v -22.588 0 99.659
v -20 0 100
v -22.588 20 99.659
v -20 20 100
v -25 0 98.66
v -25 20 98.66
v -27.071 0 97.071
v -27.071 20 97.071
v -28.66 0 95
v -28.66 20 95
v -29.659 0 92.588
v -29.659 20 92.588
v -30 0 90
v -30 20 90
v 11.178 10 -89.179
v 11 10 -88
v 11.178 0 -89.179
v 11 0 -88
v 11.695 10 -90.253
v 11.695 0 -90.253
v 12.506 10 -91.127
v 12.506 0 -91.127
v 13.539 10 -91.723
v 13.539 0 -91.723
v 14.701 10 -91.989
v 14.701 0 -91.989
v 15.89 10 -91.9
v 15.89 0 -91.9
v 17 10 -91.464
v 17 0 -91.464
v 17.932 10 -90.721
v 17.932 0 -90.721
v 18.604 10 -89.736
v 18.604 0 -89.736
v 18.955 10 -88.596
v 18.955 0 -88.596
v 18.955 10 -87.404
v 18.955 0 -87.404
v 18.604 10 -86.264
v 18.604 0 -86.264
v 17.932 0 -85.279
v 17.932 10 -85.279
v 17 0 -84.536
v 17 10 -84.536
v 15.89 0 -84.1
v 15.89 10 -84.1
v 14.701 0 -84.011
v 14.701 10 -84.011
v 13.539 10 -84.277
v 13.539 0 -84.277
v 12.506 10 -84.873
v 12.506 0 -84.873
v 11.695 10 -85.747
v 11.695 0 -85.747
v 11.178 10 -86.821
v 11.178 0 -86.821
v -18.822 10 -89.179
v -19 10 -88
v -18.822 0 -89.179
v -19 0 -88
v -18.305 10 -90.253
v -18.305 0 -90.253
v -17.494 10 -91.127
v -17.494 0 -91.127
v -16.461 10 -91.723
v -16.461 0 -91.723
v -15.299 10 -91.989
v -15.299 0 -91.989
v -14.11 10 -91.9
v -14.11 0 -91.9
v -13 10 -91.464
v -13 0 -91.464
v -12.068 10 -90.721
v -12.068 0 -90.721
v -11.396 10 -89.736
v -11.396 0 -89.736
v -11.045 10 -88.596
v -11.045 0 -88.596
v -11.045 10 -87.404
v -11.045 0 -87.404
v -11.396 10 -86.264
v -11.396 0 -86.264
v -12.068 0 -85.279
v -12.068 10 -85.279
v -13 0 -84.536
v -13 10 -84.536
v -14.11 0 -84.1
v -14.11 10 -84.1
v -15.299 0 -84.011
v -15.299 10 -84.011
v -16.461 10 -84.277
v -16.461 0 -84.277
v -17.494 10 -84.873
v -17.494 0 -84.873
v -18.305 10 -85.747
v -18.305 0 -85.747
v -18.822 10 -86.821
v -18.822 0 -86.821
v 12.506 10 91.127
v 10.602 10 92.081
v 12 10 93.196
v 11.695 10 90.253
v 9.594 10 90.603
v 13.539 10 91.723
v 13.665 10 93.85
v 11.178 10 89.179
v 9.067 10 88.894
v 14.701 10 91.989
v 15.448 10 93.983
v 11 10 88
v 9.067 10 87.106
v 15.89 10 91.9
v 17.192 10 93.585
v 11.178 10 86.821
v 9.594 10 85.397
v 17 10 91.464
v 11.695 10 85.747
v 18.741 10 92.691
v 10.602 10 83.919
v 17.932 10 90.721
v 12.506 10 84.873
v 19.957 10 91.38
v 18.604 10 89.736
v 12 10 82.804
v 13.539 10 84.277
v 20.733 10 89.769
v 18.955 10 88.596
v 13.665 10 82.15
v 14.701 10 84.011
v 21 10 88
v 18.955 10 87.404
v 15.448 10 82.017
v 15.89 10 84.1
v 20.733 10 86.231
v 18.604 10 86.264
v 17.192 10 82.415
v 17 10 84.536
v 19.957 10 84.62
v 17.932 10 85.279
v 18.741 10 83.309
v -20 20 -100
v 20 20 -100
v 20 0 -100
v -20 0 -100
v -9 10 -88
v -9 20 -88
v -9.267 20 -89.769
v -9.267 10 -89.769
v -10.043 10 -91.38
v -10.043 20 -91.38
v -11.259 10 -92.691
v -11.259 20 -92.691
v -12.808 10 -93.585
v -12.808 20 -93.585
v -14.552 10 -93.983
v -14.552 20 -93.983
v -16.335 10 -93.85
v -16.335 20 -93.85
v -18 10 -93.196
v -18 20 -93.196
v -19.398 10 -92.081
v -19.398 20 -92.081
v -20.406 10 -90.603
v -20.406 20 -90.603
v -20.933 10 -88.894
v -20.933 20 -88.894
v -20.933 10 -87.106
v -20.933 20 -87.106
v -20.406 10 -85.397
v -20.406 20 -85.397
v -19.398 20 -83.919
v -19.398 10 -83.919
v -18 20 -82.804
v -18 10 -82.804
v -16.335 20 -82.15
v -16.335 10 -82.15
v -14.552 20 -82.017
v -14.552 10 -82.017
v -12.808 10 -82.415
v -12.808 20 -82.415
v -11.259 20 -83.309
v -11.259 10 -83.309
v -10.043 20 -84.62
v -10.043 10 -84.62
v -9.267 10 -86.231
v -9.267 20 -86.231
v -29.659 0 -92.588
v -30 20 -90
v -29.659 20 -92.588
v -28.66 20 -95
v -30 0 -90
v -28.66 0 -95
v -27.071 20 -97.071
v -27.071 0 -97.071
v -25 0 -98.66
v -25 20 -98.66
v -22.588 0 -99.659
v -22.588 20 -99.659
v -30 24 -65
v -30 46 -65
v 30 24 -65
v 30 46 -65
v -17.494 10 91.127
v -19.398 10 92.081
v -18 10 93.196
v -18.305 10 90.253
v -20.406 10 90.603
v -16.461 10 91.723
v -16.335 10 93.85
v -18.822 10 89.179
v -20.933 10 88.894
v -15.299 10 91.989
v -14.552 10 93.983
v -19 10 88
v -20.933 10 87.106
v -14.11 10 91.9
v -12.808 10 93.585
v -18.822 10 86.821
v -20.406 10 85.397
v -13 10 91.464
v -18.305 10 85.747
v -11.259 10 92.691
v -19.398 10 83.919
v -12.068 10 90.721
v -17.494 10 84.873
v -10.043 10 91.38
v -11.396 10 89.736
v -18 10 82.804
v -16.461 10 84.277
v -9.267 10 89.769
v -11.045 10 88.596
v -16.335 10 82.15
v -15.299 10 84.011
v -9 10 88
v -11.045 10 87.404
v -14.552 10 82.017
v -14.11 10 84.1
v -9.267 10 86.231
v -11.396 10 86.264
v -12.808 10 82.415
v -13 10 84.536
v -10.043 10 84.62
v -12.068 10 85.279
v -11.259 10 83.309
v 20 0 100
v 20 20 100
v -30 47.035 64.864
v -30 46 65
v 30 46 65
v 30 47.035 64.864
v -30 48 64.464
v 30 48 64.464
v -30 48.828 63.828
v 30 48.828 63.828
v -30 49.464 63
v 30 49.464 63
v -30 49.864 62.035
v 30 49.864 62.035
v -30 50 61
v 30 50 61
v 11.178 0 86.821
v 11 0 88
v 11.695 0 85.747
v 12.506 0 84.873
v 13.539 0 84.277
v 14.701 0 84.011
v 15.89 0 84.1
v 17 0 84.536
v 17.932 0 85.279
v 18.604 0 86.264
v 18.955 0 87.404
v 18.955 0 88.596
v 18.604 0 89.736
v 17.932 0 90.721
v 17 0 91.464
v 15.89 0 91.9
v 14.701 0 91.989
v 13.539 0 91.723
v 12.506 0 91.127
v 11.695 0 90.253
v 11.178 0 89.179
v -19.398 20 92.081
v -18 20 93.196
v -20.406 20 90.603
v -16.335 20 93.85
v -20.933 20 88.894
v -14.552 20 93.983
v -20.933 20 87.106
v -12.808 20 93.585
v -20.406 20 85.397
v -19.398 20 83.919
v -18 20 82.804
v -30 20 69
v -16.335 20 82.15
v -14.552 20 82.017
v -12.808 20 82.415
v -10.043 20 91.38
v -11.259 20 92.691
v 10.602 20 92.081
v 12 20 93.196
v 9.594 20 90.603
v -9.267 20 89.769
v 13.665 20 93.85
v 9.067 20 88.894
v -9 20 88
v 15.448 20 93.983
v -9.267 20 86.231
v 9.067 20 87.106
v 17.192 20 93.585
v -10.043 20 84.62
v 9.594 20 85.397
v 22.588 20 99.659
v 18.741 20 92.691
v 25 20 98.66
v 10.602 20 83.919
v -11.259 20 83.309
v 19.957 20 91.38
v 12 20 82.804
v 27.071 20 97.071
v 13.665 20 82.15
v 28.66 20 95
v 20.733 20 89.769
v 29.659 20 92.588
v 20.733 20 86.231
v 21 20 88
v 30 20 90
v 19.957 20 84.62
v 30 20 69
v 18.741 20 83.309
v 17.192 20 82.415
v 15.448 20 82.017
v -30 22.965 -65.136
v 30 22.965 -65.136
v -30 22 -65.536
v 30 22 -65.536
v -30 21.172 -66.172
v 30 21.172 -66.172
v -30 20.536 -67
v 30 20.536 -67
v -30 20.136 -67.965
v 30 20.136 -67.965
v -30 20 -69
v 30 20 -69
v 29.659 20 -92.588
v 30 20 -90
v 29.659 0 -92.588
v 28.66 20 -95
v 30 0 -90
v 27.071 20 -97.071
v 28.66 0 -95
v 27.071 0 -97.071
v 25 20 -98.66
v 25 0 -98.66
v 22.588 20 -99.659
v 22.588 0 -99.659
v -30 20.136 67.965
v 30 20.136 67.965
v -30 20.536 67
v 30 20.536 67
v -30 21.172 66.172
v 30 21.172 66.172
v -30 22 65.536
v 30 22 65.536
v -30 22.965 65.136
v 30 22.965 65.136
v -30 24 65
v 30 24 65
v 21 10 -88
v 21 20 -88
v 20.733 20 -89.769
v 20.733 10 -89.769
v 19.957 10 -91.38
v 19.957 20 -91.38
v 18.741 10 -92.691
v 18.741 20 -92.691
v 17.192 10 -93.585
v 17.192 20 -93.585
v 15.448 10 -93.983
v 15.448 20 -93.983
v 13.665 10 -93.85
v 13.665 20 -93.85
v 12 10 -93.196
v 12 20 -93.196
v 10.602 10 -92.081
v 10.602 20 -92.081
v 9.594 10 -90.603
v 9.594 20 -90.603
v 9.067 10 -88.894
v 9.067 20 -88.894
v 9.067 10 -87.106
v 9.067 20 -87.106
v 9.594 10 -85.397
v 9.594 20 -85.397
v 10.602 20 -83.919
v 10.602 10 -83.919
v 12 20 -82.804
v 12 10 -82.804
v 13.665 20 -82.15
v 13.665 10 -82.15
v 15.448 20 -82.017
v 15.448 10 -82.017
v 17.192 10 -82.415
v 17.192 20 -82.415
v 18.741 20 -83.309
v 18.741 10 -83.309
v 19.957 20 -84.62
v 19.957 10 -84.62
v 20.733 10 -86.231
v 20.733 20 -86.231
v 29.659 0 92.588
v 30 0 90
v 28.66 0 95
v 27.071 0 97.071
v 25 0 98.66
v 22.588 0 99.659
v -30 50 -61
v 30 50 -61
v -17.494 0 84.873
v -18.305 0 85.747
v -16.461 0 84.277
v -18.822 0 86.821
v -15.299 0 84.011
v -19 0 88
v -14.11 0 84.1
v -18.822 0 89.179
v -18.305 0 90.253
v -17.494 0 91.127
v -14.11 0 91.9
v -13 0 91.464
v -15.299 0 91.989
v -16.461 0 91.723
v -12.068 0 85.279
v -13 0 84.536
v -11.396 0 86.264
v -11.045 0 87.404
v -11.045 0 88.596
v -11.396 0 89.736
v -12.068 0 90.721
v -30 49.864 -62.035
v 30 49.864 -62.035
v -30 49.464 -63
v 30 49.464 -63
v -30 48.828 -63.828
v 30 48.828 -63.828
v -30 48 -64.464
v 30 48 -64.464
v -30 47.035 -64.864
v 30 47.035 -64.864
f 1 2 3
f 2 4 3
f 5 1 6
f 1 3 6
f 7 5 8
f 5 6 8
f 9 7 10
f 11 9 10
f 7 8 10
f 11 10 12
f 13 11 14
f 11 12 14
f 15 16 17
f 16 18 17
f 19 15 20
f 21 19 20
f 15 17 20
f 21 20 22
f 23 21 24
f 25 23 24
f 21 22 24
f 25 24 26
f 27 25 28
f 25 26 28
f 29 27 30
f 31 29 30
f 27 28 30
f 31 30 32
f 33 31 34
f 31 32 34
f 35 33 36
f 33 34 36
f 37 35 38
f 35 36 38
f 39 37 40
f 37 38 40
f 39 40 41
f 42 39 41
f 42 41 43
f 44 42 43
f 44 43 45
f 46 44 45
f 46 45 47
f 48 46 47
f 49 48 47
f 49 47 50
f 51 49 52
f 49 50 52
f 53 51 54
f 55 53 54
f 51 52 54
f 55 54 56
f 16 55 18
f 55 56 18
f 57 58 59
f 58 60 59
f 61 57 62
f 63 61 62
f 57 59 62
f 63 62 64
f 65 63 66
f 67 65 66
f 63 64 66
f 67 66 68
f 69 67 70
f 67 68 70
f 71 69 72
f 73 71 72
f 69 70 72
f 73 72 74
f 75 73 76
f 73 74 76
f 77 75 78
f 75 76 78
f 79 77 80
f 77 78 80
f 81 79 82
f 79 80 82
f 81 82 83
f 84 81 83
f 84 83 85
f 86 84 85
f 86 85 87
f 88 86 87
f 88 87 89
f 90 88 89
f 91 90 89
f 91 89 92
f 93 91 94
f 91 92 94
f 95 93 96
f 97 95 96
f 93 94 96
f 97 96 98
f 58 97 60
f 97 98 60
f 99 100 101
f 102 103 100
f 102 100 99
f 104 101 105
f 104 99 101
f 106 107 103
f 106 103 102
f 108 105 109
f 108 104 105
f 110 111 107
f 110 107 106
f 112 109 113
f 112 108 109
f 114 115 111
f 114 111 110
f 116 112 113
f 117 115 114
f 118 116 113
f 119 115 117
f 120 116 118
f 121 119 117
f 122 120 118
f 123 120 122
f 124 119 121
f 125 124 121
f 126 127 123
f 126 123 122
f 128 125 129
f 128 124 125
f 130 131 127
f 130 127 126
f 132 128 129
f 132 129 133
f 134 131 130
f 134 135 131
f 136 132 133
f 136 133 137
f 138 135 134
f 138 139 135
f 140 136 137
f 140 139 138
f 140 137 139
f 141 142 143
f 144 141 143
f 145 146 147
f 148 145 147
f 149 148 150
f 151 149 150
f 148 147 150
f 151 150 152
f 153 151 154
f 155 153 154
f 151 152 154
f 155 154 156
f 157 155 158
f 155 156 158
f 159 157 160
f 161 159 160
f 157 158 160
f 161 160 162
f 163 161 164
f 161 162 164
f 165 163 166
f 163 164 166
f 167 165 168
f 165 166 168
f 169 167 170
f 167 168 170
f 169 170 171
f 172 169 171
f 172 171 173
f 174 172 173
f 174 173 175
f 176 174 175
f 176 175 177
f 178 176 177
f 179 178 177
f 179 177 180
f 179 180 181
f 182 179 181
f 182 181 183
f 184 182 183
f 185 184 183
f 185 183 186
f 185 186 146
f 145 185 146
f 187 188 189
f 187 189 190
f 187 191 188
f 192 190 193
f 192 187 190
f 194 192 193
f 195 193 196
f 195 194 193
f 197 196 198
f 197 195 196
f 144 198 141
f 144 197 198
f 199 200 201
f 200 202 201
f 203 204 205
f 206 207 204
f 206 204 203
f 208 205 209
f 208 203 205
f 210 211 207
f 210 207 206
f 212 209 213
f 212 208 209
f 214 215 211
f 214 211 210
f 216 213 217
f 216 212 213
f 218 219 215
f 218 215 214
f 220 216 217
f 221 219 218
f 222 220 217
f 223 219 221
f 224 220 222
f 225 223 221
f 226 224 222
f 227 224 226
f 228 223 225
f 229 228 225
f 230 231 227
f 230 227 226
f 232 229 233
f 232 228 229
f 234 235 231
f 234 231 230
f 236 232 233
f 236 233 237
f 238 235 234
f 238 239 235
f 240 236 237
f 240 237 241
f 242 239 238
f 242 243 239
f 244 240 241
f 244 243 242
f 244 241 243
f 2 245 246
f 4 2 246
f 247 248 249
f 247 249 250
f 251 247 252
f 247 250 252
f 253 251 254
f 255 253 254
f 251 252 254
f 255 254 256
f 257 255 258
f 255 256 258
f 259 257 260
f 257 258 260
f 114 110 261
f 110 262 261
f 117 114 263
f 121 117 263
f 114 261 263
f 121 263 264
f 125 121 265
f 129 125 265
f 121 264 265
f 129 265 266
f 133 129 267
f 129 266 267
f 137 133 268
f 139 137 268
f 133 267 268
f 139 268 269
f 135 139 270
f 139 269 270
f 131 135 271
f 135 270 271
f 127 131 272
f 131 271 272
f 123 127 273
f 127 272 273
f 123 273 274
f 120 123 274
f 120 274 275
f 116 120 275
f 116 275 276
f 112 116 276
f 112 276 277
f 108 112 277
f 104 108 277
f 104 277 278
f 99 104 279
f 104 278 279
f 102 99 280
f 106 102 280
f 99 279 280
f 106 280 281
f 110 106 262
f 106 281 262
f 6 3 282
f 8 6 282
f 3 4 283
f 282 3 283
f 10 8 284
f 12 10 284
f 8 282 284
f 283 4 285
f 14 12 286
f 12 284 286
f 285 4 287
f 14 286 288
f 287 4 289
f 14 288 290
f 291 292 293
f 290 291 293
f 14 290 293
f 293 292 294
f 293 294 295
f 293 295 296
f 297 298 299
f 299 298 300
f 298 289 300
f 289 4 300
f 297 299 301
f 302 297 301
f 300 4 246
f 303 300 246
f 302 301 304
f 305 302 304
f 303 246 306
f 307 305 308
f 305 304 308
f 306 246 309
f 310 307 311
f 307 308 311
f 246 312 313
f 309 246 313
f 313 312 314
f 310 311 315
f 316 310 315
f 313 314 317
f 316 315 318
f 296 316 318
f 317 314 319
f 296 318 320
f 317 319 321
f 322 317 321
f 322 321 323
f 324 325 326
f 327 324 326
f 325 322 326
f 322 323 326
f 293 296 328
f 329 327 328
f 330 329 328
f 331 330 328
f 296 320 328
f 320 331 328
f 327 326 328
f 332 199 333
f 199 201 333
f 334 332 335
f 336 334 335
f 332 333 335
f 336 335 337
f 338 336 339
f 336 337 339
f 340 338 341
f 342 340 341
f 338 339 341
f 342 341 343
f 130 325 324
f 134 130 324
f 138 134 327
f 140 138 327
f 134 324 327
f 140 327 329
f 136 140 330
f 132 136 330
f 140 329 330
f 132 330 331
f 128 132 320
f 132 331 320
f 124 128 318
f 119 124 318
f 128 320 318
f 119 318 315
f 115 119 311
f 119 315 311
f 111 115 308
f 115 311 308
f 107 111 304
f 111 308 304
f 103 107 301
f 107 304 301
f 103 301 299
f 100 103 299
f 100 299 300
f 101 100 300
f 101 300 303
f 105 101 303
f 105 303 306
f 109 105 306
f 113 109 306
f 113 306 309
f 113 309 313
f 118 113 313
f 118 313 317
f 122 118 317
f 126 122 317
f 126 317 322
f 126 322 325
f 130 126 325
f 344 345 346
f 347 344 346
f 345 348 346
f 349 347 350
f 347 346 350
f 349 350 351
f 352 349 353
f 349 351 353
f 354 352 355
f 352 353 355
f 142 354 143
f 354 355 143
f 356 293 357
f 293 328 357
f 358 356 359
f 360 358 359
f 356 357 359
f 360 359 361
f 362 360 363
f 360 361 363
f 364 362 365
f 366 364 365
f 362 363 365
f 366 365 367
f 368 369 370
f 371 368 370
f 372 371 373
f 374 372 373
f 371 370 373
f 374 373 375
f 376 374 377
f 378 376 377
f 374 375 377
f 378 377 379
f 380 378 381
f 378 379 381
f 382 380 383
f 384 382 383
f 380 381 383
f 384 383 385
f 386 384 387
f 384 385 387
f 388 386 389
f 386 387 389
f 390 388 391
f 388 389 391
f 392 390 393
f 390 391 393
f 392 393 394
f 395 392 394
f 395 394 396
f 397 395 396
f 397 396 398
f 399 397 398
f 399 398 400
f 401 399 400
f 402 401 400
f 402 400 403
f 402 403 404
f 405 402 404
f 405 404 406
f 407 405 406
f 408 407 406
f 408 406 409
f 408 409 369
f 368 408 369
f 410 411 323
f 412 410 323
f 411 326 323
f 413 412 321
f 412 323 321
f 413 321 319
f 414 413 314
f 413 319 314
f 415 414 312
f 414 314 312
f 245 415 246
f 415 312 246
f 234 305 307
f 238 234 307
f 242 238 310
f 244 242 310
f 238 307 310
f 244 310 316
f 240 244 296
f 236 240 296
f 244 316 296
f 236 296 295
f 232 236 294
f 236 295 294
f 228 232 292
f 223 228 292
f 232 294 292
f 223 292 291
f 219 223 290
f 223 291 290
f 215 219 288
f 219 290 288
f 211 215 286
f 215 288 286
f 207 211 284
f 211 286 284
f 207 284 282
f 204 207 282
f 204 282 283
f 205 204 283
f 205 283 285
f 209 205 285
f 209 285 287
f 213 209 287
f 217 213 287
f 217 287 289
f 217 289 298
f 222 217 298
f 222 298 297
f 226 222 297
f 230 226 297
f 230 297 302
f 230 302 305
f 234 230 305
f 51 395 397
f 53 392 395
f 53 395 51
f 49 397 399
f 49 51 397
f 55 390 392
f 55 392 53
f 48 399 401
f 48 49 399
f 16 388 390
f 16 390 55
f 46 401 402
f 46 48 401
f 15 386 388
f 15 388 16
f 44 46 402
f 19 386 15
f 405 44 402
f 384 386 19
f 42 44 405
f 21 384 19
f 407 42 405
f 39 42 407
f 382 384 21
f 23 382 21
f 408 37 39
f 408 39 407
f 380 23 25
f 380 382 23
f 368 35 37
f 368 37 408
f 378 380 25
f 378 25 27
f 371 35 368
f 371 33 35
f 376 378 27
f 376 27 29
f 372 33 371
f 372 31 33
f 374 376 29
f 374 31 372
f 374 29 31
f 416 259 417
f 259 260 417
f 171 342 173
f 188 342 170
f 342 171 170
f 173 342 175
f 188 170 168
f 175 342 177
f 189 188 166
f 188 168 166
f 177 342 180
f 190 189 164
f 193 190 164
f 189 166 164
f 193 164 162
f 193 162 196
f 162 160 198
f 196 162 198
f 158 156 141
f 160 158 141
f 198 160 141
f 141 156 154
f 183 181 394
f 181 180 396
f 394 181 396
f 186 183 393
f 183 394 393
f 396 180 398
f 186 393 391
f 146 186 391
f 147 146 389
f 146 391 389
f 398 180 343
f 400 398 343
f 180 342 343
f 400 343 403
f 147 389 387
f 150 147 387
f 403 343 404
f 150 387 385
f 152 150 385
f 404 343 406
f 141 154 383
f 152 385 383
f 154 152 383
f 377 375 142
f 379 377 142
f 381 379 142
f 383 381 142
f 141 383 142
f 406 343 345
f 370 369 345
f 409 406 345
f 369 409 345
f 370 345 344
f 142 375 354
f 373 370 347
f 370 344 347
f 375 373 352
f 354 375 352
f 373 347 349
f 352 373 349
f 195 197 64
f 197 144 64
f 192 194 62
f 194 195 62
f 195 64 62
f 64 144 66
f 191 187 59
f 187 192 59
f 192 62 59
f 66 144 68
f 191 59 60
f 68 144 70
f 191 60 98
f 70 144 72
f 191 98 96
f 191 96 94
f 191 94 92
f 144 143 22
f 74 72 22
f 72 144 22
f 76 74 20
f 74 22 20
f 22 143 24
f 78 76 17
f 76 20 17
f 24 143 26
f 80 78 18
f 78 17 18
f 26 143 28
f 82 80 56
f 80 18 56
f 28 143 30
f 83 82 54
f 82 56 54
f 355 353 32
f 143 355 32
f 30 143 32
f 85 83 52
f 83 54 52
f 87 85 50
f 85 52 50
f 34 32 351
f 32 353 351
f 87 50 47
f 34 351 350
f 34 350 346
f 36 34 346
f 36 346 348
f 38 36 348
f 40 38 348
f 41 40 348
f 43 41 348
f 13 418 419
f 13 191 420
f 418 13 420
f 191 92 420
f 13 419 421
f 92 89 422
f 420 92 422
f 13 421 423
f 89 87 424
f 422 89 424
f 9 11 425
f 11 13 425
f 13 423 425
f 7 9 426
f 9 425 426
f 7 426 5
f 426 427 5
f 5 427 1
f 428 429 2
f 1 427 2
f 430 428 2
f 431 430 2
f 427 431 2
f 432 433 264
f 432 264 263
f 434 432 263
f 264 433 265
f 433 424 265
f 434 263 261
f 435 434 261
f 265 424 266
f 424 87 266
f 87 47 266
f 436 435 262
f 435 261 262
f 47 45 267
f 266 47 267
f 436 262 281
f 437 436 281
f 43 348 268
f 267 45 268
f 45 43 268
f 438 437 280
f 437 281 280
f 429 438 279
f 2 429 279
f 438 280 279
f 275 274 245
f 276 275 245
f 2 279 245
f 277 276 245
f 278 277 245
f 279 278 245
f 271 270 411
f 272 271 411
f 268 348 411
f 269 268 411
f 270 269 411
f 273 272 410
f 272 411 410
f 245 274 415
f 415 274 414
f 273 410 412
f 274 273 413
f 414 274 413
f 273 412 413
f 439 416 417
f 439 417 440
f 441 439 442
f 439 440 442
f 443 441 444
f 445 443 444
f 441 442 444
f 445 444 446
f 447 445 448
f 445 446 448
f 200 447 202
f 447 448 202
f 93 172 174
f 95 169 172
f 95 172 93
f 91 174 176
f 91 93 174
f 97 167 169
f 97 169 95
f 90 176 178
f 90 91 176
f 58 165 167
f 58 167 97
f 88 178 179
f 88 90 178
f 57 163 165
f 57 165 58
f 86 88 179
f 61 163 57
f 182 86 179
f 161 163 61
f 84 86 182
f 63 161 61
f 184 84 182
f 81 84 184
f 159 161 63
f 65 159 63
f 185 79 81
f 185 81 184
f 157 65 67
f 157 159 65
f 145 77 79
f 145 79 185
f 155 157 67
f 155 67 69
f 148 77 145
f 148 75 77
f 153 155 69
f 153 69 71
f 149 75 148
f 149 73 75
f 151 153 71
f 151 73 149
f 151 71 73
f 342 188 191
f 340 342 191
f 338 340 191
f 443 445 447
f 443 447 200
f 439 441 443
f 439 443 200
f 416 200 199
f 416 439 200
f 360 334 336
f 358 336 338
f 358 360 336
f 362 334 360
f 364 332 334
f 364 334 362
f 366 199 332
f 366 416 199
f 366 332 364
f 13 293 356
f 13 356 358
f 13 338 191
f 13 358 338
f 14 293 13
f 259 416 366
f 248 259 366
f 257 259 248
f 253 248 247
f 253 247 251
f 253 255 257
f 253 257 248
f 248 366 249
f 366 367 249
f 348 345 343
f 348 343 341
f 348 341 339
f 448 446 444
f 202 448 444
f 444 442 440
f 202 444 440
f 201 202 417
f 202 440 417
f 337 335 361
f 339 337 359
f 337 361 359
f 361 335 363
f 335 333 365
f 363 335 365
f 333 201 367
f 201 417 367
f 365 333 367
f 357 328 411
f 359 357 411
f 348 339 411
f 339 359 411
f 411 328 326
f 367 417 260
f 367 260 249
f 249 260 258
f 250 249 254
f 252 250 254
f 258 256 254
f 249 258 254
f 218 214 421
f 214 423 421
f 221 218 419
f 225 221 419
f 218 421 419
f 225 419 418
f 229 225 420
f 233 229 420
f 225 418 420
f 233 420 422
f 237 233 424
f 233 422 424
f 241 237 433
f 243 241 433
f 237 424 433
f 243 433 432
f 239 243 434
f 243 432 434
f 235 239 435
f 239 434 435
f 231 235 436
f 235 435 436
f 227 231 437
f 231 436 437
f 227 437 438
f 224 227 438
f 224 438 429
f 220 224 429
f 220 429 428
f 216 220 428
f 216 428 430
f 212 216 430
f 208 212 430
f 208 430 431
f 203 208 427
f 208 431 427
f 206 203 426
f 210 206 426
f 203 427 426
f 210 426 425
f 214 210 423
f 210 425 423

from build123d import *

# Parameters (mm, degrees)
BOSS_EXTRUDE1_DEPTH                      = 30
FILLET1_R                                = 10
CBORE_FOR_M12_HEX_HEAD_BOLT1_D           = 8
CBORE_FOR_M12_HEX_HEAD_BOLT1_CBORE_D     = 12
CBORE_FOR_M12_HEX_HEAD_BOLT1_CBORE_DEPTH = 10


with BuildPart() as part:
    # Sketch1 → Boss-Extrude1 (new, symmetric)
    with BuildSketch(Plane(origin=(0, 0, 0), x_dir=(0, 0, -1), z_dir=(1, 0, 0))):
        with BuildLine():
            Line((100, 0), (-100, 0))
            Line((-100, 0), (-100, 20))
            Line((-100, 20), (-69, 20))
            ThreePointArc((-69, 20), (-66.171572875, 21.171572875), (-65, 24))
            Line((-65, 24), (-65, 46))
            ThreePointArc((-65, 46), (-63.828427125, 48.828427125), (-61, 50))
            Line((-61, 50), (61, 50))
            ThreePointArc((61, 50), (63.828427125, 48.828427125), (65, 46))
            Line((65, 46), (65, 24))
            ThreePointArc((65, 24), (66.171572875, 21.171572875), (69, 20))
            Line((69, 20), (100, 20))
            Line((100, 20), (100, 0))
        make_face()
    extrude(amount=BOSS_EXTRUDE1_DEPTH, both=True)

    # Fillet1
    fillet1_edges = [part.edges().sort_by_distance(p)[0] for p in [
        (-30, 10, 100),
        (-30, 10, -100),
        (30, 10, 100),
        (30, 10, -100),
    ]]
    fillet(fillet1_edges, radius=FILLET1_R)

    # CBORE for M12 Hex Head Bolt1 (through all)
    with Locations(Plane(origin=(0, 20, 0), x_dir=(1, 0, 0), z_dir=(0, 1, 0))):
        with Locations((-15, -88), (15, -88), (15, 88), (-15, 88)):
            CounterBoreHole(CBORE_FOR_M12_HEX_HEAD_BOLT1_D / 2, CBORE_FOR_M12_HEX_HEAD_BOLT1_CBORE_D / 2, CBORE_FOR_M12_HEX_HEAD_BOLT1_CBORE_DEPTH)


solid = part.part
